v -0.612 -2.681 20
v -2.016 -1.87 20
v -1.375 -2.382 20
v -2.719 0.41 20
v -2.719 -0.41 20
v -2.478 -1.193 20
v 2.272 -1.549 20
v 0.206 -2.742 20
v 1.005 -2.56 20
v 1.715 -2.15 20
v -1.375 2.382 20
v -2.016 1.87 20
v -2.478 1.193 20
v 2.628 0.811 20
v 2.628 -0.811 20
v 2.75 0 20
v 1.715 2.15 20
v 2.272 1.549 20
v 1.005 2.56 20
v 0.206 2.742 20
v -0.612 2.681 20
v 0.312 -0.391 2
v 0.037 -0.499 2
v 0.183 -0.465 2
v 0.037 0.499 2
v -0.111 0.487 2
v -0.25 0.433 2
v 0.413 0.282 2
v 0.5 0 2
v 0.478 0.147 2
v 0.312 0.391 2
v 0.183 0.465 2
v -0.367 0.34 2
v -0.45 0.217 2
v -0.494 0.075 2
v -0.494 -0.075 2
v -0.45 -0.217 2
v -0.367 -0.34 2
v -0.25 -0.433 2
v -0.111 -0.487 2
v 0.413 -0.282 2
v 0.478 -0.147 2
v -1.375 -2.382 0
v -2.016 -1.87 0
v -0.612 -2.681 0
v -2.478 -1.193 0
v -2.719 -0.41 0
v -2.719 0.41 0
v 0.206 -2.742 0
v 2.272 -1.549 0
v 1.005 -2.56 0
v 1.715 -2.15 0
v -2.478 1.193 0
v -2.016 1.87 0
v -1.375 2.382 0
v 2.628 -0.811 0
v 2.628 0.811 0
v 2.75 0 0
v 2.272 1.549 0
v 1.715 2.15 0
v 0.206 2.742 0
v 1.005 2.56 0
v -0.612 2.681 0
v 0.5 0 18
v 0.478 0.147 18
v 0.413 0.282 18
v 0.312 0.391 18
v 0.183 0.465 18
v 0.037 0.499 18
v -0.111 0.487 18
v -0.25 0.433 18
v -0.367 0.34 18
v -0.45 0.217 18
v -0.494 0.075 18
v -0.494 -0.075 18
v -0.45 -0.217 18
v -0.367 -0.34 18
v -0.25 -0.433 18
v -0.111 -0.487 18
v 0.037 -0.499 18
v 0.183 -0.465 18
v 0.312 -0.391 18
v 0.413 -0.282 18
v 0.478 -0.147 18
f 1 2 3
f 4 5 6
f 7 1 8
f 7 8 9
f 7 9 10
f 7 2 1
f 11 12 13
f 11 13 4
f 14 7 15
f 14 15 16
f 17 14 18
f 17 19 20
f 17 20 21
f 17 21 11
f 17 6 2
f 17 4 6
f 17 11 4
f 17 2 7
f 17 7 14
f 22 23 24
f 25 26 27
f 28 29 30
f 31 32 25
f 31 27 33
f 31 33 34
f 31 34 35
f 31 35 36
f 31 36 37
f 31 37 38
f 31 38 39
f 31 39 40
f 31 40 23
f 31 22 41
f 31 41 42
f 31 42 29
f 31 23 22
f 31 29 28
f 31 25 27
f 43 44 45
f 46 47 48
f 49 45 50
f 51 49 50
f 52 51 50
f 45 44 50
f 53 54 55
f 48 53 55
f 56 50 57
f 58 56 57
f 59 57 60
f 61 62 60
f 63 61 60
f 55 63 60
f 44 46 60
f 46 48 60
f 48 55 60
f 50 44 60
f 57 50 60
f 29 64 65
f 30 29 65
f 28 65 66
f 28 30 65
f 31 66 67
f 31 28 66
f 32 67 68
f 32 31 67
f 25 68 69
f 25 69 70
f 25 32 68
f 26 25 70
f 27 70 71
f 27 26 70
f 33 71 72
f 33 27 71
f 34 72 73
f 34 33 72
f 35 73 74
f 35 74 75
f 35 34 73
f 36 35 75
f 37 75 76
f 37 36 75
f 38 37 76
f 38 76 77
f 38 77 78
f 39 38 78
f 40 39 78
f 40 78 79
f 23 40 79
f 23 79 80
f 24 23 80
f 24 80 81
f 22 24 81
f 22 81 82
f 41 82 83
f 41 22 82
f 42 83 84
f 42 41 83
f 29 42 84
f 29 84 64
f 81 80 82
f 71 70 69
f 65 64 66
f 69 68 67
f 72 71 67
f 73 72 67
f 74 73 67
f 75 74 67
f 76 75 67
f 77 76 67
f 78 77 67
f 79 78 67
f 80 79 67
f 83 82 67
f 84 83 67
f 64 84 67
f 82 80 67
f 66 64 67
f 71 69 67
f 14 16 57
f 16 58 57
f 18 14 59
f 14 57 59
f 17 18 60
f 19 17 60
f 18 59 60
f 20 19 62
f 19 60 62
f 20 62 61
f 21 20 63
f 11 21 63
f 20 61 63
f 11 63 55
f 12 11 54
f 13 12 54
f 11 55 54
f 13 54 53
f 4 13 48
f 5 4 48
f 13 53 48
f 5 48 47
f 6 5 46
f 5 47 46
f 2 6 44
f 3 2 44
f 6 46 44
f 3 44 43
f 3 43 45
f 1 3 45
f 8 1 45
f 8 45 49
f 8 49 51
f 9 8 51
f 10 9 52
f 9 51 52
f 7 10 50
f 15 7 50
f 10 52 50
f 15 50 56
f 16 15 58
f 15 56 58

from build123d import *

# Parameters (mm, degrees)
F0_R     = 2.75
F1_DEPTH = 2
F2_R     = 2.75
F2_R_2   = 0.5
F3_DEPTH = 16
F4_R     = 2.75
F5_DEPTH = 2


with BuildPart() as f1:
    # F0 (on Top) → F1 (new body)
    with BuildSketch(Plane.XY):
        Circle(F0_R)
    extrude(amount=F1_DEPTH)

    # F2 (on face) → F3 (join)
    with BuildSketch(Plane.XY.offset(2)):
        Circle(F2_R)
        Circle(F2_R_2, mode=Mode.SUBTRACT)
    extrude(amount=F3_DEPTH)

    # F4 (on face) → F5 (join)
    with BuildSketch(Plane.XY.offset(18)):
        Circle(F4_R)
    extrude(amount=F5_DEPTH)


solid = f1.part
